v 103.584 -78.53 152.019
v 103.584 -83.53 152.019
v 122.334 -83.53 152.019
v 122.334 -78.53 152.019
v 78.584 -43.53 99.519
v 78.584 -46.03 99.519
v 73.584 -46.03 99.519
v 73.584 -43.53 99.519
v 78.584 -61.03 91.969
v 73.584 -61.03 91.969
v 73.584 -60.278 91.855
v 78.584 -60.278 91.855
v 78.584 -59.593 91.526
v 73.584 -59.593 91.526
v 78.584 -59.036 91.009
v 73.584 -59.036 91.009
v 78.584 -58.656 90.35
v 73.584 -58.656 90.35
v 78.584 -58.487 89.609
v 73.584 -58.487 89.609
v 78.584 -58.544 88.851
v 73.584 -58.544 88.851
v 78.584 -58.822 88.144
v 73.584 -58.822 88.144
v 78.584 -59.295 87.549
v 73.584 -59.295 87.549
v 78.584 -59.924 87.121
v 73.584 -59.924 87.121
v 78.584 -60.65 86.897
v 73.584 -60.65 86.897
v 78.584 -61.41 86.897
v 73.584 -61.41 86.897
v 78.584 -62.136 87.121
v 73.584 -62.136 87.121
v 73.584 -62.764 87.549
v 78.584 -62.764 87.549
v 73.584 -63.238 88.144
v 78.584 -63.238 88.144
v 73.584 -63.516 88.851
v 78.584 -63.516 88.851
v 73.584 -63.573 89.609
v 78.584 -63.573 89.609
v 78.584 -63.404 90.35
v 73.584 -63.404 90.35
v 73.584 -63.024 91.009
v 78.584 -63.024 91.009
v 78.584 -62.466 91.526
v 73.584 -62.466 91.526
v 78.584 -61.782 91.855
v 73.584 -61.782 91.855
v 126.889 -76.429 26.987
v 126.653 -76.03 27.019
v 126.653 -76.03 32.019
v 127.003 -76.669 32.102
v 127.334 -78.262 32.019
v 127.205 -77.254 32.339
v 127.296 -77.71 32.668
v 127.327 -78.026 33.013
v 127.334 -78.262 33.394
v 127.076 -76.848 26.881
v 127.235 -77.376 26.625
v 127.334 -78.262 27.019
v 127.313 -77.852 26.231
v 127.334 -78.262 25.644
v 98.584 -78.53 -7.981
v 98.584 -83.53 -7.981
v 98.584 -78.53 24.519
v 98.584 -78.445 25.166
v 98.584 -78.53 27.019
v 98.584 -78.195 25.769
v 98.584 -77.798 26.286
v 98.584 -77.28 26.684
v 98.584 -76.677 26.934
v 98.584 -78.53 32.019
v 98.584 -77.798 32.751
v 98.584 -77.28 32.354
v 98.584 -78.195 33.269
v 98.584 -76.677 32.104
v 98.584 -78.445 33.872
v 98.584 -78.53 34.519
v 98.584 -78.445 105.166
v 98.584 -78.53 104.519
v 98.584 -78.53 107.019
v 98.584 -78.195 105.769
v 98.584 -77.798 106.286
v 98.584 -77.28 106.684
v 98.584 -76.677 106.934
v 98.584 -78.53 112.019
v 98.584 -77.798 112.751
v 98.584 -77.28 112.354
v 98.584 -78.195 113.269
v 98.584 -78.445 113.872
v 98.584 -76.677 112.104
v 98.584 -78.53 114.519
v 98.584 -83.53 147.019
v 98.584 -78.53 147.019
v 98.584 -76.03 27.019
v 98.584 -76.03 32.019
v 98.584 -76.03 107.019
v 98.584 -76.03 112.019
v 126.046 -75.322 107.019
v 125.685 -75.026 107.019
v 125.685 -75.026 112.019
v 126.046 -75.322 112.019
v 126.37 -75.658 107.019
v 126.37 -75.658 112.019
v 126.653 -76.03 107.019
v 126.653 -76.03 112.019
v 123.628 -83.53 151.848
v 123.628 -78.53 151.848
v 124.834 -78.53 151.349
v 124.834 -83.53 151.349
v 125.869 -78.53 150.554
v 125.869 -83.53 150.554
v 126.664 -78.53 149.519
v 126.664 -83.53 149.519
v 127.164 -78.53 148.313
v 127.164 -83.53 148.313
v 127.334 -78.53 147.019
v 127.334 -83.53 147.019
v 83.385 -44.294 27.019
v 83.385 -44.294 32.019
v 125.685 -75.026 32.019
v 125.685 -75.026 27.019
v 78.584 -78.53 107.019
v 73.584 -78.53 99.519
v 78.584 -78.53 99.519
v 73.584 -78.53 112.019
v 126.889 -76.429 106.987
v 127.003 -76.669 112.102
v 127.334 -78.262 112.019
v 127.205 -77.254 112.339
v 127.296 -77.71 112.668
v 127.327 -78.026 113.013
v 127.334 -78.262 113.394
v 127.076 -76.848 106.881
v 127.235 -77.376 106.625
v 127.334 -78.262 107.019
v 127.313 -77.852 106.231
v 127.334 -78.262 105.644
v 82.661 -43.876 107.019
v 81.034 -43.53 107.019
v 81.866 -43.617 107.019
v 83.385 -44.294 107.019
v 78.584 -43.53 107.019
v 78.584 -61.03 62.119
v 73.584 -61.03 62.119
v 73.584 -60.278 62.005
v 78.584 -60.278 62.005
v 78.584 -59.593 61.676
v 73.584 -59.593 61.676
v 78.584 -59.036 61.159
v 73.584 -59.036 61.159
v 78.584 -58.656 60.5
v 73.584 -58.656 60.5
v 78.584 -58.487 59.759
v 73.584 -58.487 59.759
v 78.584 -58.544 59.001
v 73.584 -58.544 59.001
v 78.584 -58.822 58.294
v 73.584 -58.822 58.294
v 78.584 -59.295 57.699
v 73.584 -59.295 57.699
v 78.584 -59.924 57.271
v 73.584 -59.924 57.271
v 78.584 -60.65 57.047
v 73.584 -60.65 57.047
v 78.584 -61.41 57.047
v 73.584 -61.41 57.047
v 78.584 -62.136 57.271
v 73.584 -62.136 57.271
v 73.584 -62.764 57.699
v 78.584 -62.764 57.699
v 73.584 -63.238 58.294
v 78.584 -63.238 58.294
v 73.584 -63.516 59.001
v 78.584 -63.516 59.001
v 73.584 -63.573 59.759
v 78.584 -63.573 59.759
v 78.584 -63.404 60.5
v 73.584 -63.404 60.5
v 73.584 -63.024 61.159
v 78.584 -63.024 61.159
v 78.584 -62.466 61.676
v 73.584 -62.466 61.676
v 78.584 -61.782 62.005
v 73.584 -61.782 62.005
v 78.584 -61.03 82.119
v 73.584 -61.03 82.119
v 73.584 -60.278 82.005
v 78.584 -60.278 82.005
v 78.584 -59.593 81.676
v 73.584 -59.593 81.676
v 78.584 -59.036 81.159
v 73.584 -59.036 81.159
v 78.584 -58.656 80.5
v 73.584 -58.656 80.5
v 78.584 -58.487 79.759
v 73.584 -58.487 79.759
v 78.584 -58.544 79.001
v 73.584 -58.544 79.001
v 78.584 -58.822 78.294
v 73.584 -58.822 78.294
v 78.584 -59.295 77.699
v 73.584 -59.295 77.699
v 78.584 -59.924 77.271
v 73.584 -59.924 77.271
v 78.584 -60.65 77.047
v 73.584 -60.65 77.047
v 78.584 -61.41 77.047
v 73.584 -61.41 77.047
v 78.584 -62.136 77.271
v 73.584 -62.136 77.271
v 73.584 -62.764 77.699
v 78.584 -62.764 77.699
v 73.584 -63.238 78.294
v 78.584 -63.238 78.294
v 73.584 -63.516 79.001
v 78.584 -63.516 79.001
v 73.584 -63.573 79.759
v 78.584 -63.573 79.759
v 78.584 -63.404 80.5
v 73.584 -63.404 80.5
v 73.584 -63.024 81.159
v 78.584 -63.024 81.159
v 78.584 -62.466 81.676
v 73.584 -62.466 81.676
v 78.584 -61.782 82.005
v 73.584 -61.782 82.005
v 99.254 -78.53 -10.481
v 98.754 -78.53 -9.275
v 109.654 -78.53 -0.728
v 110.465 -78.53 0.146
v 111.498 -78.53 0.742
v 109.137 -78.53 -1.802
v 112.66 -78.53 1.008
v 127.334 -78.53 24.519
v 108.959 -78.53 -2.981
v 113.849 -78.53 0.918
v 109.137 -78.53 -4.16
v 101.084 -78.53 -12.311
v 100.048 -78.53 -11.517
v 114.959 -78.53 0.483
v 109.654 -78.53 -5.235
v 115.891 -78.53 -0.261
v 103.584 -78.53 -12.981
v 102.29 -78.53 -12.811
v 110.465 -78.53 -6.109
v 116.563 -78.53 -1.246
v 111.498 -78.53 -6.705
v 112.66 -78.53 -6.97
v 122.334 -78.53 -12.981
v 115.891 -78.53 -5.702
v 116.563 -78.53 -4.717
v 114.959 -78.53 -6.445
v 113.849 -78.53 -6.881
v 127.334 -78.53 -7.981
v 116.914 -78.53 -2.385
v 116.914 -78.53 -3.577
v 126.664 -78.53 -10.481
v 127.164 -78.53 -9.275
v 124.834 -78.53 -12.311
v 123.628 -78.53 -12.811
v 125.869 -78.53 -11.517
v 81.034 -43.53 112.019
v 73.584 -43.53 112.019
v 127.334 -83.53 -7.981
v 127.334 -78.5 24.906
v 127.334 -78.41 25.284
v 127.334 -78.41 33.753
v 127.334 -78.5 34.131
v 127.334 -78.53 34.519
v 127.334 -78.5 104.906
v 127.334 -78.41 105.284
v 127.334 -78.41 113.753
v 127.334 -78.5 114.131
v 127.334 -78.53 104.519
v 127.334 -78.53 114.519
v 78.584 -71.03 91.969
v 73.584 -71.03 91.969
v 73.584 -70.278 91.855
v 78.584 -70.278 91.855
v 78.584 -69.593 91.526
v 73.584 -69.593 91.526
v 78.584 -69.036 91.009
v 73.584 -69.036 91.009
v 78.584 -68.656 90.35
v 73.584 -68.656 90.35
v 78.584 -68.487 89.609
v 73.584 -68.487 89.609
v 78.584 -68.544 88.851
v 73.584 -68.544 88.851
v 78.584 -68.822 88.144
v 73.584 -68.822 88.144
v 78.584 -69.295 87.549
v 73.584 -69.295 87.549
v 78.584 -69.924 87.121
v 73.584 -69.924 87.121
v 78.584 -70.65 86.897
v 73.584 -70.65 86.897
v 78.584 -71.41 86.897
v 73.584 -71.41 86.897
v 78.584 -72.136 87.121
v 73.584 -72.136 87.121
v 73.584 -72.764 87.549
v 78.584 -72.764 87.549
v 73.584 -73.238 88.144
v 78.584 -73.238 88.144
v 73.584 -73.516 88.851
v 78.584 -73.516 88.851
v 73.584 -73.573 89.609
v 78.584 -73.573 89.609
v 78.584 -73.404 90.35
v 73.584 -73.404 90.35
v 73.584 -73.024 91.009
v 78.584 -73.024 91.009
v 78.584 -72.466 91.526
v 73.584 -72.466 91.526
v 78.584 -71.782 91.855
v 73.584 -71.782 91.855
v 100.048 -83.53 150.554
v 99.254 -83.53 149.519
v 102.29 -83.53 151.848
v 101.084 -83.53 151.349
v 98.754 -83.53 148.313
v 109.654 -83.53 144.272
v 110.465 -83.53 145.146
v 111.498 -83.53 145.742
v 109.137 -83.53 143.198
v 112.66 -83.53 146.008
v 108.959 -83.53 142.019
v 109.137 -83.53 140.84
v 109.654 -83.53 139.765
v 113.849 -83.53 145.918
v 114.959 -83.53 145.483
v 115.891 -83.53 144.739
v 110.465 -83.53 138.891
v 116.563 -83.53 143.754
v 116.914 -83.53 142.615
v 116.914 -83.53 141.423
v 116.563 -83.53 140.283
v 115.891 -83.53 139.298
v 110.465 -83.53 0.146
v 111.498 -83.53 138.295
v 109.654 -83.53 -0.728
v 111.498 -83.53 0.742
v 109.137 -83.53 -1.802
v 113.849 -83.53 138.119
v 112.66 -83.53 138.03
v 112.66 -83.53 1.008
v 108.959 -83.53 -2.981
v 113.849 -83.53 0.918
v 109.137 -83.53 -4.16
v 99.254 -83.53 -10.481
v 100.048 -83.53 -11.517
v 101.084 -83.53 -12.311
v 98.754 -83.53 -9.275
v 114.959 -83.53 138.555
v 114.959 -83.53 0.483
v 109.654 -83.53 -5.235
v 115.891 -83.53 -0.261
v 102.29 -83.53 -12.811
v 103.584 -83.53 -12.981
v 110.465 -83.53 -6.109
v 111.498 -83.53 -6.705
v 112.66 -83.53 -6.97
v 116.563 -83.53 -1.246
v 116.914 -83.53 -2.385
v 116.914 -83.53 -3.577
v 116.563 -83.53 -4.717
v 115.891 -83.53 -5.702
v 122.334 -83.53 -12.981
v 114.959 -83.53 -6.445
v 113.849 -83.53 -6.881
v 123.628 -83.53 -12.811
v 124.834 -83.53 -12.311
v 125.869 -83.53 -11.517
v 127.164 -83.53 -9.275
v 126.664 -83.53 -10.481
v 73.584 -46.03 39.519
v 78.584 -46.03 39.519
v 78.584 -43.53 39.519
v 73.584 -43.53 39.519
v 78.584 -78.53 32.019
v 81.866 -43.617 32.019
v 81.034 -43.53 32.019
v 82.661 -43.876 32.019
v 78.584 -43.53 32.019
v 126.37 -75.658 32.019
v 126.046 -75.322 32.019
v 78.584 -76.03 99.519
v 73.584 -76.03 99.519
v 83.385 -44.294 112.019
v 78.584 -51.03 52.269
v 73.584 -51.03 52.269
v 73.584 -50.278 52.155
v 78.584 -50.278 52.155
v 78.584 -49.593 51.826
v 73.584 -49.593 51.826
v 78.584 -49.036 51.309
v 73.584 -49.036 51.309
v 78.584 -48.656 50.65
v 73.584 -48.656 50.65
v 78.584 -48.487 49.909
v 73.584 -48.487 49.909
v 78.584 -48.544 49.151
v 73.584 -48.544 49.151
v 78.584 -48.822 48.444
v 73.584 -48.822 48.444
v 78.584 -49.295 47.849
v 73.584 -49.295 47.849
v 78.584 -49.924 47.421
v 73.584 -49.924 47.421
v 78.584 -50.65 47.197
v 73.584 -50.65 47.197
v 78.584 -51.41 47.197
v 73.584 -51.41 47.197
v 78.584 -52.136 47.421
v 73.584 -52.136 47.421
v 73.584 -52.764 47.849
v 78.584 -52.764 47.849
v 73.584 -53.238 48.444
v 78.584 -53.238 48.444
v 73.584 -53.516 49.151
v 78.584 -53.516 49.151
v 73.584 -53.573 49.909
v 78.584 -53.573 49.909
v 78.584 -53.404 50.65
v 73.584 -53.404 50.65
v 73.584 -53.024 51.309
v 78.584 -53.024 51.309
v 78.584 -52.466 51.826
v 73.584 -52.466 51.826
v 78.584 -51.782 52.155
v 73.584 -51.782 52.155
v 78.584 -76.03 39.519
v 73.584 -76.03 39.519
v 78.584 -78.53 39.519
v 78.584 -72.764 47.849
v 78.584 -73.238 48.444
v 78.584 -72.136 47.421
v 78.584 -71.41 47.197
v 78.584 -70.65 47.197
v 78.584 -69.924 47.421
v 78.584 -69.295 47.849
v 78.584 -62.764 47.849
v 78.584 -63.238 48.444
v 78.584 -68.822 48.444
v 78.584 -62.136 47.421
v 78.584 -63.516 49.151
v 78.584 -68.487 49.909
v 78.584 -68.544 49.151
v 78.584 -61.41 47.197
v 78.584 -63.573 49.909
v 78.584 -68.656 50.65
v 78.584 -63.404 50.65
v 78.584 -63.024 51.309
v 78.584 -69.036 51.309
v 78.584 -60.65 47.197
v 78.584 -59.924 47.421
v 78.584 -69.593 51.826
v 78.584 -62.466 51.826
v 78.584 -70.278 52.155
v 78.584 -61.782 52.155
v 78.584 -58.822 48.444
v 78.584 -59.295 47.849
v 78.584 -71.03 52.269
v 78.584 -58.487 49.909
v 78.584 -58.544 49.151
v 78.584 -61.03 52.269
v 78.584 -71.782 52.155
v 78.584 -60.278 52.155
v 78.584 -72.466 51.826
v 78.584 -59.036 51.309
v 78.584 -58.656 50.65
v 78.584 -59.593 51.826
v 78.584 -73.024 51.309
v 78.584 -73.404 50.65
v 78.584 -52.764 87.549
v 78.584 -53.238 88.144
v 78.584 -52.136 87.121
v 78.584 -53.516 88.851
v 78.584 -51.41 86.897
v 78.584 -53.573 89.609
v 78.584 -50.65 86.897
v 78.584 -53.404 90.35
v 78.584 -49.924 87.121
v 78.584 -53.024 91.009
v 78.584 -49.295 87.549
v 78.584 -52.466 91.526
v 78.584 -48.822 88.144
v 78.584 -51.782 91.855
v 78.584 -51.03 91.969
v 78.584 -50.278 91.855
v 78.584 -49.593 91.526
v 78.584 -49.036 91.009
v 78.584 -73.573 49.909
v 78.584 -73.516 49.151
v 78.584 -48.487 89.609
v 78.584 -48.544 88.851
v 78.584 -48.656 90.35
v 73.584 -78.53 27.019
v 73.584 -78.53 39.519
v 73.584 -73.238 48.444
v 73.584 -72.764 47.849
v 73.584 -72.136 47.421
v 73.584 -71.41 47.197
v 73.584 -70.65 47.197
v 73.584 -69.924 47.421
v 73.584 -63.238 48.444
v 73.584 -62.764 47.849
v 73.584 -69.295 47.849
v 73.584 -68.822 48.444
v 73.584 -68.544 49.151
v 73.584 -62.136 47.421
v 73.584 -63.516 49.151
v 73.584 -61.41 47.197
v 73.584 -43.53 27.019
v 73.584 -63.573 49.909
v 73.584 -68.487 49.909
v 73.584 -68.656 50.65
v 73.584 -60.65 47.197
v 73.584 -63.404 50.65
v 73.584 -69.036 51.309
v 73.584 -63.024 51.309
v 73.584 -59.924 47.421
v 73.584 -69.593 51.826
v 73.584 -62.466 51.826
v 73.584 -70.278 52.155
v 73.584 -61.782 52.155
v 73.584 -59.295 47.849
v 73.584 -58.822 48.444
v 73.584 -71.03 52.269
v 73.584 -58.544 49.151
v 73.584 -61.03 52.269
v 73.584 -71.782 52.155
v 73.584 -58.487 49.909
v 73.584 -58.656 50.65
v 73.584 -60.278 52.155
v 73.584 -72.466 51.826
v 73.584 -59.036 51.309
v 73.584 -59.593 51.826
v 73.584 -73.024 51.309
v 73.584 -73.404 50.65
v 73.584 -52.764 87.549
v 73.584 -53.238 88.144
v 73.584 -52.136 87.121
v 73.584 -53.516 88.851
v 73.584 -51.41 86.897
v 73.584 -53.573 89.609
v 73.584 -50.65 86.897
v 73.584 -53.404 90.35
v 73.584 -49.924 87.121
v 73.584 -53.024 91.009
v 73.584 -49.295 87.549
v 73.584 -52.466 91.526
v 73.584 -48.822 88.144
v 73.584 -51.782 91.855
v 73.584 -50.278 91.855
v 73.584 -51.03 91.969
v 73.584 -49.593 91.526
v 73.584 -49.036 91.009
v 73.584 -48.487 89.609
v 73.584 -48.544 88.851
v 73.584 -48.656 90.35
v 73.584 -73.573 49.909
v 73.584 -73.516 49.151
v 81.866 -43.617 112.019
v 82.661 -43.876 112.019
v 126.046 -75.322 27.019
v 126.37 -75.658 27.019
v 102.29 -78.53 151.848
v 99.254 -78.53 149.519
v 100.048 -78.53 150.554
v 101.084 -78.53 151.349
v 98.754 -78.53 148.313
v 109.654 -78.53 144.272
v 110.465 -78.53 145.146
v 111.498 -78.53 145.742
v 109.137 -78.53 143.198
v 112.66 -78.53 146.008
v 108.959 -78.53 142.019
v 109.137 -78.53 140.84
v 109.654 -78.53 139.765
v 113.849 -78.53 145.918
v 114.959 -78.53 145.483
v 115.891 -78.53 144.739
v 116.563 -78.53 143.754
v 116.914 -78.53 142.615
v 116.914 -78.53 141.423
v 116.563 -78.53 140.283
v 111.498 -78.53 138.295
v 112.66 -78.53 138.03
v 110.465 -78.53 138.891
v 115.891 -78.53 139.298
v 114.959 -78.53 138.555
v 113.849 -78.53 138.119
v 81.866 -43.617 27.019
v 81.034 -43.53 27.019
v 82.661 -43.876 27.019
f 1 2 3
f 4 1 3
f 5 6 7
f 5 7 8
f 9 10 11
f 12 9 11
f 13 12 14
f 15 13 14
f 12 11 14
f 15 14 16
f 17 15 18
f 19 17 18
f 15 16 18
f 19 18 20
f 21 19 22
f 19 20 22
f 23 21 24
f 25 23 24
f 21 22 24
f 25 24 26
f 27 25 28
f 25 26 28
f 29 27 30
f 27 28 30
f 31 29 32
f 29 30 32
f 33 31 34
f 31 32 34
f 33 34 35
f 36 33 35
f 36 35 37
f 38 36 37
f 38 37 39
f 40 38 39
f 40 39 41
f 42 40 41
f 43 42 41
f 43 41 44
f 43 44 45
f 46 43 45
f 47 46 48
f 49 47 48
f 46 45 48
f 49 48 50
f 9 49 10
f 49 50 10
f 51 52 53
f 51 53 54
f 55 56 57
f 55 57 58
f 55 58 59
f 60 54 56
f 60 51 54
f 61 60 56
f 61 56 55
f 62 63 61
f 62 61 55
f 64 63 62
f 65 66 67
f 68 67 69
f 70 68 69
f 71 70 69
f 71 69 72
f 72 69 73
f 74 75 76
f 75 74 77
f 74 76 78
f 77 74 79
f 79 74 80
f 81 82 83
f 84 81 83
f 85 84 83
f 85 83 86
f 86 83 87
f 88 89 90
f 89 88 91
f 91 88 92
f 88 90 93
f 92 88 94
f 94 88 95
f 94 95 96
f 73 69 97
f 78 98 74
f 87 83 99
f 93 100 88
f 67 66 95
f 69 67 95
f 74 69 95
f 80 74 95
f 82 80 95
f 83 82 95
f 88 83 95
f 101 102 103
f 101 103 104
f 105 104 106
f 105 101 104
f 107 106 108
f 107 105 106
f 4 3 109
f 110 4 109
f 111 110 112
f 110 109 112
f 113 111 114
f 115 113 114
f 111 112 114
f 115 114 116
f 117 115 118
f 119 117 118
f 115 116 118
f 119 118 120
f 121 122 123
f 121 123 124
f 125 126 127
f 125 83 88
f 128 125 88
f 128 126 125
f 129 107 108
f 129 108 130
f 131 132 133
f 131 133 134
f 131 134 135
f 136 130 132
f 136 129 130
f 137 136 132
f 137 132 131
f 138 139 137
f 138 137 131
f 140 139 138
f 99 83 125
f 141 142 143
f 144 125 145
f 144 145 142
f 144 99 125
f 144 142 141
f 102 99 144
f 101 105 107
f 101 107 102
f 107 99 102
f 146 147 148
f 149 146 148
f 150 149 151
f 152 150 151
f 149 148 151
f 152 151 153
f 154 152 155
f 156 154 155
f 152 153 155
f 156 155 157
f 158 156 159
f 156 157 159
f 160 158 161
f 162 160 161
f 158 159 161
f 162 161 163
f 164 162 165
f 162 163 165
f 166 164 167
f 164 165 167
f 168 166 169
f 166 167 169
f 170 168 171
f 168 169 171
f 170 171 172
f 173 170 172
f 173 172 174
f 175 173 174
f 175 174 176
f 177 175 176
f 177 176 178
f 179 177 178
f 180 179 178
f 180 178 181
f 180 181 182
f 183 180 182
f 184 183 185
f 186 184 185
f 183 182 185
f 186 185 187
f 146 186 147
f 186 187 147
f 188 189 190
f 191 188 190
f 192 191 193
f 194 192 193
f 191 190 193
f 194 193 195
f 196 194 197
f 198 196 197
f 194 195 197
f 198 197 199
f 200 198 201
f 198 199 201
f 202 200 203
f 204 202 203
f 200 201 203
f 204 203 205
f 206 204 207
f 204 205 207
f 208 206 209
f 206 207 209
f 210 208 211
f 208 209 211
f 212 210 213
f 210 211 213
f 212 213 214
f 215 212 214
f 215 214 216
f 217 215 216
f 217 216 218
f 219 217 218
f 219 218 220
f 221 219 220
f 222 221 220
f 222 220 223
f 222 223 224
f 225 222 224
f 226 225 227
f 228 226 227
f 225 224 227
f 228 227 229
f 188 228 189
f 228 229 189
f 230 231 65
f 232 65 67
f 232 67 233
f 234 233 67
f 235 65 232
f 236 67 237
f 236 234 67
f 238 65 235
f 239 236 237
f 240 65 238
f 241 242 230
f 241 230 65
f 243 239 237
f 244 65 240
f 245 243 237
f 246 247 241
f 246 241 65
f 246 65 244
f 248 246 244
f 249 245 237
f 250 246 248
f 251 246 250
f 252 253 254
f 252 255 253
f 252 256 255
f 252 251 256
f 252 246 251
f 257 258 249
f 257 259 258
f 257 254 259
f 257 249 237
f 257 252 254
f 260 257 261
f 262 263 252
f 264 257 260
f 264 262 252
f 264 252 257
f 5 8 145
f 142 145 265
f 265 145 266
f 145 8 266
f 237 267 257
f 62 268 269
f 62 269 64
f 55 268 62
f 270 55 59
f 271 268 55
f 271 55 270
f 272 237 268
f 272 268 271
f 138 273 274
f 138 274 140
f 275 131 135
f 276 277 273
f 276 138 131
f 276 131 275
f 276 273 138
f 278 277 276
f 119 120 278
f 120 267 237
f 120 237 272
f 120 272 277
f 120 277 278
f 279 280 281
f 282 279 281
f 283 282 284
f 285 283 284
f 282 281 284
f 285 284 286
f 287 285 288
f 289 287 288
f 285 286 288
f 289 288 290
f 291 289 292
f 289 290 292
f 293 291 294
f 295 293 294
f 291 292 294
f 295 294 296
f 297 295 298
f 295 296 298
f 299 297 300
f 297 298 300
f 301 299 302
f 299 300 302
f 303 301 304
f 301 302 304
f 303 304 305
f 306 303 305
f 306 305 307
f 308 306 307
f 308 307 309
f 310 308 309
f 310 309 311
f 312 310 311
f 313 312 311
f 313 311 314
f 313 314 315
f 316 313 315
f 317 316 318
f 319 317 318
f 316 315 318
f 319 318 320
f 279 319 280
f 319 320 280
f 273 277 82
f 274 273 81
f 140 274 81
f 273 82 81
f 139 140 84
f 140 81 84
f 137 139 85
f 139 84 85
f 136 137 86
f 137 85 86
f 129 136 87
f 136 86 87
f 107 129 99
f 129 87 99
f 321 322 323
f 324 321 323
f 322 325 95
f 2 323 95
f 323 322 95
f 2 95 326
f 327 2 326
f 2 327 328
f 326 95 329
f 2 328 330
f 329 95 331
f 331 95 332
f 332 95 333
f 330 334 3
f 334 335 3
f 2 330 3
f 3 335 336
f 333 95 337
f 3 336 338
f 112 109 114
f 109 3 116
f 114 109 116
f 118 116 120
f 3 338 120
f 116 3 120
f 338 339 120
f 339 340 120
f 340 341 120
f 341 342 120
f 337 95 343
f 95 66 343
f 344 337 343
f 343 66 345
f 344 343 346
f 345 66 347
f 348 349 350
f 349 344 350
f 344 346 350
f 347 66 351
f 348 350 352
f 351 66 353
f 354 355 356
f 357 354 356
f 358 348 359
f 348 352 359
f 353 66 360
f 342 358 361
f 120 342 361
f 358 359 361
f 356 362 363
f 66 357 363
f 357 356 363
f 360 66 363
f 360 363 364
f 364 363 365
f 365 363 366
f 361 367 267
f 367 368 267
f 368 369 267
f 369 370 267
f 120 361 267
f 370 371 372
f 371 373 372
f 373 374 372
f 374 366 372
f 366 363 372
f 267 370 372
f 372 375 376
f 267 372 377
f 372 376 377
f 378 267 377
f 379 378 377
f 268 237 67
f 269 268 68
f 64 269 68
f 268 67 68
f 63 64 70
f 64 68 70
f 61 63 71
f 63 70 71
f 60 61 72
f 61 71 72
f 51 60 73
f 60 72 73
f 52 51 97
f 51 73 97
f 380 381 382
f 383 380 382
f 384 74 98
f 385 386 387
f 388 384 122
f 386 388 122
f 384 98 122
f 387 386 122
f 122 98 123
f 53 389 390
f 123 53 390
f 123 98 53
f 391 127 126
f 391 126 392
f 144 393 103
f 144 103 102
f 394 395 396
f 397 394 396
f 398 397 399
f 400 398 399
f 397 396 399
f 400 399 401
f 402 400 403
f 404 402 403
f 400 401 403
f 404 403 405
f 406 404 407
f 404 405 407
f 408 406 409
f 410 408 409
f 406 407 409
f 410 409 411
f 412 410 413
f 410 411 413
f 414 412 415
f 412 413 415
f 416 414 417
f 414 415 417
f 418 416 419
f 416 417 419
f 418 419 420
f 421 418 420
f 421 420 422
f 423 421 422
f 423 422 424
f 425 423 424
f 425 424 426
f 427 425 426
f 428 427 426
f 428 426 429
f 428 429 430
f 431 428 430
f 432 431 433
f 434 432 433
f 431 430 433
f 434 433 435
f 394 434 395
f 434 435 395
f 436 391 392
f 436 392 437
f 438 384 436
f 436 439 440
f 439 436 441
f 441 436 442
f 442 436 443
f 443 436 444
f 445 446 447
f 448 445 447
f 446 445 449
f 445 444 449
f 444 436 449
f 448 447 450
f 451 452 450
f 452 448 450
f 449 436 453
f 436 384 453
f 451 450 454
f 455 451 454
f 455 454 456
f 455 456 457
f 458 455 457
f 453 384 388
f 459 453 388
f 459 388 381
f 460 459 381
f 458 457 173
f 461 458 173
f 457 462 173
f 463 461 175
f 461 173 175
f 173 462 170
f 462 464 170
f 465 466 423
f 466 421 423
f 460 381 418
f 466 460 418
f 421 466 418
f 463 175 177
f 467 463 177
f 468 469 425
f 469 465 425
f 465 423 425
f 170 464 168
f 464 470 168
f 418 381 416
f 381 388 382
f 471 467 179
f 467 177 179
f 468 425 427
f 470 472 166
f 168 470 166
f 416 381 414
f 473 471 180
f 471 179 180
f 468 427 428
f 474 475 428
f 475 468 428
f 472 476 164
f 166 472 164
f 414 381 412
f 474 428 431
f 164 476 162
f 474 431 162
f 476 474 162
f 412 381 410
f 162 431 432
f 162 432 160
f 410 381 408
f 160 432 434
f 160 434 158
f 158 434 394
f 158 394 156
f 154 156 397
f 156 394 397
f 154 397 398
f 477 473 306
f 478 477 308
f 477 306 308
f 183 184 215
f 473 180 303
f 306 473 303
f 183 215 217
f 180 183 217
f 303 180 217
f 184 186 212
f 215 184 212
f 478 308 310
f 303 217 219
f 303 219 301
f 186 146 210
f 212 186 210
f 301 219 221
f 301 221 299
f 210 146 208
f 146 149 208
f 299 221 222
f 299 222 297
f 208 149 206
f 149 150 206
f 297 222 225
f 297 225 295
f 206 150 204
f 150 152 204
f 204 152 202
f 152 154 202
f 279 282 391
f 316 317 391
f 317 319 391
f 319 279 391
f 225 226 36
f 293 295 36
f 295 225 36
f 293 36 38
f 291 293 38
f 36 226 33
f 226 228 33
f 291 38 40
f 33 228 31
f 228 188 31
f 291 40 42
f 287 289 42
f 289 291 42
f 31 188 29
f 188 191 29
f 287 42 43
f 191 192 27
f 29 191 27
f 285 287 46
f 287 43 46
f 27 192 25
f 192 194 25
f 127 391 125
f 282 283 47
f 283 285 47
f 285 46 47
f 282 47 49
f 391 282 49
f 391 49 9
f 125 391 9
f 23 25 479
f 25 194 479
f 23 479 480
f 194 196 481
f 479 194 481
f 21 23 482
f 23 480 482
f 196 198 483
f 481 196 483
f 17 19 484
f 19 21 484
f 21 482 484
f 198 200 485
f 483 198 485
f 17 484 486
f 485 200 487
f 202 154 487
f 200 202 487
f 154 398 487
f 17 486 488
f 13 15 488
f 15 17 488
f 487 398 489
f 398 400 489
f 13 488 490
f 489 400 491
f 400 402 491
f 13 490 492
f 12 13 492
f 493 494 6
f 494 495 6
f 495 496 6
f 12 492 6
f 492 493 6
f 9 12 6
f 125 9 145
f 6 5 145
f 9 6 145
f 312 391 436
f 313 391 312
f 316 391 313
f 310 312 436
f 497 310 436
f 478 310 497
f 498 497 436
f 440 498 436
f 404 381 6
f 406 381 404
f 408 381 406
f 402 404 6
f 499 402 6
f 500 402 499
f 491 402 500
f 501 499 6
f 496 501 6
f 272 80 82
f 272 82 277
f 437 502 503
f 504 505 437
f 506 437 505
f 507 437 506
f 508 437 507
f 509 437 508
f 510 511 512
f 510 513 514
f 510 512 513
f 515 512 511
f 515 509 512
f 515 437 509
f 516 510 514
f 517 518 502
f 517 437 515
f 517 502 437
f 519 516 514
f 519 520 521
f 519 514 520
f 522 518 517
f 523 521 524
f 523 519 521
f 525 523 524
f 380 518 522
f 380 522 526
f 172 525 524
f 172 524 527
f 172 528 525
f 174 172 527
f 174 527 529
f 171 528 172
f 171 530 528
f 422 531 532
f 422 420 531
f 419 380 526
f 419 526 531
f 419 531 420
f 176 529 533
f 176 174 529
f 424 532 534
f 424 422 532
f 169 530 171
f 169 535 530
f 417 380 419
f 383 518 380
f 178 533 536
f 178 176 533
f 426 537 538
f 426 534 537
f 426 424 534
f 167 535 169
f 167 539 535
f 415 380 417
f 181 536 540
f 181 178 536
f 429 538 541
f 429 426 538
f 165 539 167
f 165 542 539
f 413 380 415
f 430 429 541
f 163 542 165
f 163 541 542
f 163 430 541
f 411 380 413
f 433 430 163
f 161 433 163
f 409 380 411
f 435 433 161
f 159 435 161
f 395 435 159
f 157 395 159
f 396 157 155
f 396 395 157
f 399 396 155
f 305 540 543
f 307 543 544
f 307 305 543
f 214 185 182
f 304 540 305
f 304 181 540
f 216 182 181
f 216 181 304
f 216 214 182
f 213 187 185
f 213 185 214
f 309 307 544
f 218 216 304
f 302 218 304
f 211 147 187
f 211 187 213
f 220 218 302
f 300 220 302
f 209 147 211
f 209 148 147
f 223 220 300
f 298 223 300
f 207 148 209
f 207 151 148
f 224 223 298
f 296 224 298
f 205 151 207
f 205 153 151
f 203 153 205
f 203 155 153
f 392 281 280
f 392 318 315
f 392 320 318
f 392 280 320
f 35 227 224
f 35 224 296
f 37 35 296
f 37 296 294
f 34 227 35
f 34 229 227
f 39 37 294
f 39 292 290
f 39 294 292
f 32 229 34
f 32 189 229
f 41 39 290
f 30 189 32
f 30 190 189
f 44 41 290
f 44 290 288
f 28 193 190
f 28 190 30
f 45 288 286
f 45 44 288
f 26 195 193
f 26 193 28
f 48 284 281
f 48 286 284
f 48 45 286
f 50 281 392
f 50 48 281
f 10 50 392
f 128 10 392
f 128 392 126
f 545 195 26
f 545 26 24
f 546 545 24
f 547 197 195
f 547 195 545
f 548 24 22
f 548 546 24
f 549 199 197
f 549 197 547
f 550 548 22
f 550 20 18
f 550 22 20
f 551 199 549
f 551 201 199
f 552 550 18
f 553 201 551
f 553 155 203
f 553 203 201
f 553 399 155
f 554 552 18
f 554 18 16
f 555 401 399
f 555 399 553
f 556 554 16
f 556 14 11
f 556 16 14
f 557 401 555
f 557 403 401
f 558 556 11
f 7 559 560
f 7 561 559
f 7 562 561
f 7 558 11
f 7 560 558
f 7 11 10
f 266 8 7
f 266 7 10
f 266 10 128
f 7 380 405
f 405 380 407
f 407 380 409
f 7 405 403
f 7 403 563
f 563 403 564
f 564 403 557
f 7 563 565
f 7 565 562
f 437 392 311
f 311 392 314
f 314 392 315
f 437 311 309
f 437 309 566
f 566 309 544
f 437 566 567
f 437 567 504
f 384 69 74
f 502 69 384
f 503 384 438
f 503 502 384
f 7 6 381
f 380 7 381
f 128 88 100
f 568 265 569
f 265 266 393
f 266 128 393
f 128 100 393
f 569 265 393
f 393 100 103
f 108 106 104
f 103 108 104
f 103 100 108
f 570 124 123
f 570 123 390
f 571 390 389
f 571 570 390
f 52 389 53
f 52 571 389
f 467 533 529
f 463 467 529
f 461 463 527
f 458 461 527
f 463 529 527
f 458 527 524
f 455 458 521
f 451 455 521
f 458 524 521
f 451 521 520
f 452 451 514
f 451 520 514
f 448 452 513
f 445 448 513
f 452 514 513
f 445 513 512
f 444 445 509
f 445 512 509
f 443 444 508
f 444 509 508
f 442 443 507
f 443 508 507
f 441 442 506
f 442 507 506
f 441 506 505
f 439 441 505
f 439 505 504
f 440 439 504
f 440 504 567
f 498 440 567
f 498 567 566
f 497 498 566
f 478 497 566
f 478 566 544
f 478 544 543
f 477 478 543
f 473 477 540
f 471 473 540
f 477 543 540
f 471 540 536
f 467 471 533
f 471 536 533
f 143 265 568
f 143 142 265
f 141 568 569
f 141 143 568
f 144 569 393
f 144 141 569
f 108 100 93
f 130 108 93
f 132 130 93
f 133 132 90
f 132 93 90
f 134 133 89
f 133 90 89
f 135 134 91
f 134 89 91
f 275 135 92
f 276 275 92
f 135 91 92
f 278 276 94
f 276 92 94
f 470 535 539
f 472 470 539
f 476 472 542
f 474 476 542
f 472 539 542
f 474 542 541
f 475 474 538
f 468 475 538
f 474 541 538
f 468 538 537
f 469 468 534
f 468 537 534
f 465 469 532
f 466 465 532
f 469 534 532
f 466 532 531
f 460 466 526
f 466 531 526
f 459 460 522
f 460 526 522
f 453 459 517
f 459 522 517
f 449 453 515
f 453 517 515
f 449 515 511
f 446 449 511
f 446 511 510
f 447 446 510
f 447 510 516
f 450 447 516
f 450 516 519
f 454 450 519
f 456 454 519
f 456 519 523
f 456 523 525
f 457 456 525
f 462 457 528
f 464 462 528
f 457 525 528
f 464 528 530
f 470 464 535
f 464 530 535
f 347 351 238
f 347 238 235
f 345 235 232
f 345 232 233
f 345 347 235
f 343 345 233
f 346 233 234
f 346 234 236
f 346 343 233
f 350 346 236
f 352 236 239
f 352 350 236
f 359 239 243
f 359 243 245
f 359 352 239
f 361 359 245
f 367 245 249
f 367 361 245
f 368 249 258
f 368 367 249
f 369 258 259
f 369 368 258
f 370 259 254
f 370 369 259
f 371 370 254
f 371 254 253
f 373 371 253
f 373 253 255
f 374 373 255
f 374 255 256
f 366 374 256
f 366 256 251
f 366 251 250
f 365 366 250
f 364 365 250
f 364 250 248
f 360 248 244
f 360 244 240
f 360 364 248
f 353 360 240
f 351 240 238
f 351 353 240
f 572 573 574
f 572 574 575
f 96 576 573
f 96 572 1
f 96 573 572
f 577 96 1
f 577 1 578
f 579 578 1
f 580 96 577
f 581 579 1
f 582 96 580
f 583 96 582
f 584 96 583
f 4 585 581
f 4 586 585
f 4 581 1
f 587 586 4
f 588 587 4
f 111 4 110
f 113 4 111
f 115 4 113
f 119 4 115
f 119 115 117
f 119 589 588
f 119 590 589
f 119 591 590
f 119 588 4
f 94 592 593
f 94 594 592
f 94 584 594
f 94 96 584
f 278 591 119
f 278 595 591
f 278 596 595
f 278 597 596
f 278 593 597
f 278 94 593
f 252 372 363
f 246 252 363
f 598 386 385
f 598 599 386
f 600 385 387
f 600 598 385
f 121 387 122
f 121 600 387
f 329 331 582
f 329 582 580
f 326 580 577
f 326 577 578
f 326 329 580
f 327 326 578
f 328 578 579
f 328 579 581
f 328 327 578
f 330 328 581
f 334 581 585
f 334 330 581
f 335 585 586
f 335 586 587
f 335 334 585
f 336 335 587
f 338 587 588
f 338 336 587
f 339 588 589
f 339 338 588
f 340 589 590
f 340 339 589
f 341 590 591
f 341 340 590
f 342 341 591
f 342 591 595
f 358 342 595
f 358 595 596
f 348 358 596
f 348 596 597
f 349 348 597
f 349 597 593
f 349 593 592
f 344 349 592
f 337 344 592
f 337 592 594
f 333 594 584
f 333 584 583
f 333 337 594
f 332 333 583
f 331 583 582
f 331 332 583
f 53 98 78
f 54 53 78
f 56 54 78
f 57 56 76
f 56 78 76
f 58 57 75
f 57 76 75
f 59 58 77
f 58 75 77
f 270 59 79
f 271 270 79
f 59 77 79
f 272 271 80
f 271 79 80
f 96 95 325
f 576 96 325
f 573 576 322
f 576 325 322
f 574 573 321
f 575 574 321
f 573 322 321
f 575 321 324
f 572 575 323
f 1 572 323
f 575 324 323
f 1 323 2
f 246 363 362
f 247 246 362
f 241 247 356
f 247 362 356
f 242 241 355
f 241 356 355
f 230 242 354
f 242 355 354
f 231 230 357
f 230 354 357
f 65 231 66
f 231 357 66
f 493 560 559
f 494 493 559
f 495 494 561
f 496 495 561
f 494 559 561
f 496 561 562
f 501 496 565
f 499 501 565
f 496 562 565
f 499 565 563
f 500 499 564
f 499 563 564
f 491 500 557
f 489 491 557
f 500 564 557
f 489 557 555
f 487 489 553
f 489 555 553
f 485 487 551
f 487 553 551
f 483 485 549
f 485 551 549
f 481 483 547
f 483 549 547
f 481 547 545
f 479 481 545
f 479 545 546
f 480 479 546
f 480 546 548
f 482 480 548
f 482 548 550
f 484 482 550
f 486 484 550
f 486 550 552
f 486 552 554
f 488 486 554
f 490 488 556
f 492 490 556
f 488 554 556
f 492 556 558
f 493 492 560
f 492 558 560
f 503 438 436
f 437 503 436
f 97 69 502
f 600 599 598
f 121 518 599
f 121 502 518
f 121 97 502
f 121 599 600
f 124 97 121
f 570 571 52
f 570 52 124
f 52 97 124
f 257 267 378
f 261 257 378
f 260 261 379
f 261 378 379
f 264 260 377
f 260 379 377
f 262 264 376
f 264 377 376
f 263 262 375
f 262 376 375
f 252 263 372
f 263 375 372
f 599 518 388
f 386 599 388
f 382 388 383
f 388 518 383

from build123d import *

# Parameters (mm, degrees)
SKETCH1_R           = 4
BOSS_EXTRUDE1_DEPTH = 5
SKETCH2_W           = 5
SKETCH2_H           = 35
BOSS_EXTRUDE2_DEPTH = 53.75
SKETCH3_W           = 75
SKETCH3_H           = 35
SKETCH3_R           = 2.55
BOSS_EXTRUDE3_DEPTH = 5
CHAMFER1_SIZE       = 45
CHAMFER1_SIZE2      = 32.69441376
FILLET1_R           = 4
FILLET2_START       = 98.583917136
FILLET2_DEPTH       = 28.75
FILLET2_START_2     = 25.643804114
FILLET2_2_DEPTH     = 87.749778627
SKETCH4_W           = 60
SKETCH4_H           = 5
CUT_EXTRUDE1_DEPTH  = 5


with BuildPart() as part:
    # Sketch1 → Boss-Extrude1 (new body)
    with BuildSketch(Plane(origin=(0, -83.529928381, 0), x_dir=(1, 0, 0), z_dir=(0, 1, 0))):
        with BuildLine():
            Line((103.583917136, -152.018693427), (122.333917136, -152.018693427))
            ThreePointArc((122.333917136, -152.018693427), (125.869451042, -150.554227333), (127.333917136, -147.018693427))
            Line((127.333917136, -147.018693427), (127.333917136, 7.981306573))
            ThreePointArc((127.333917136, 7.981306573), (125.869451042, 11.516840479), (122.333917136, 12.981306573))
            Line((122.333917136, 12.981306573), (103.583917136, 12.981306573))
            ThreePointArc((103.583917136, 12.981306573), (100.04838323, 11.516840479), (98.583917136, 7.981306573))
            Line((98.583917136, 7.981306573), (98.583917136, -147.018693427))
            ThreePointArc((98.583917136, -147.018693427), (100.04838323, -150.554227333), (103.583917136, -152.018693427))
        make_face()
        with Locations(Location((112.958917136, -142.018693427, 0), (0, 0, 180))):
            Circle(SKETCH1_R, mode=Mode.SUBTRACT)
        with Locations(Location((112.958917136, 2.981306573, 0), (0, 0, 180))):
            Circle(SKETCH1_R, mode=Mode.SUBTRACT)
    extrude(amount=BOSS_EXTRUDE1_DEPTH)

    # Sketch2 → Boss-Extrude2 (add)
    with BuildSketch(Plane(origin=(127.333917136, 0, 0), x_dir=(0, 0, -1), z_dir=(1, 0, 0))):
        with Locations((-109.518693427, -61.029928381)):
            Rectangle(SKETCH2_W, SKETCH2_H)
        with Locations((-29.518693427, -61.029928381)):
            Rectangle(SKETCH2_W, SKETCH2_H)
    extrude(amount=-BOSS_EXTRUDE2_DEPTH)

    # Sketch3 → Boss-Extrude3 (add)
    with BuildSketch(Plane.ZY.offset(-73.583917136)):
        with Locations((69.518693427, -61.029928381)):
            Rectangle(SKETCH3_W, SKETCH3_H)
        with Locations((49.718693427, -61.029928381)):
            Circle(SKETCH3_R, mode=Mode.SUBTRACT)
        with Locations((89.418693427, -61.029928381)):
            Circle(SKETCH3_R, mode=Mode.SUBTRACT)
        with Locations((89.418693427, -71.029928381)):
            Circle(SKETCH3_R, mode=Mode.SUBTRACT)
        with Locations((89.418693427, -51.029928381)):
            Circle(SKETCH3_R, mode=Mode.SUBTRACT)
        with Locations((49.718693427, -51.029928381)):
            Circle(SKETCH3_R, mode=Mode.SUBTRACT)
        with Locations((49.718693427, -71.029928381)):
            Circle(SKETCH3_R, mode=Mode.SUBTRACT)
        with Locations((59.568693427, -61.029928381)):
            Circle(SKETCH3_R, mode=Mode.SUBTRACT)
        with Locations((79.568693427, -61.029928381)):
            Circle(SKETCH3_R, mode=Mode.SUBTRACT)
    extrude(amount=-BOSS_EXTRUDE3_DEPTH)

    # Chamfer1
    chamfer1_edges = [part.edges().sort_by_distance(p)[0] for p in [
        (127.333917136, -43.529928381, 109.518693427),
        (127.333917136, -43.529928381, 29.518693427),
    ]]
    chamfer1_side = [part.faces().sort_by_distance(p)[0] for p in [
        (100.458917136, -43.529928381, 111.013006473),
    ]]
    chamfer(chamfer1_edges, length=CHAMFER1_SIZE, length2=CHAMFER1_SIZE2, reference=chamfer1_side[0])

    # Fillet1
    fillet1_edges = [part.edges().sort_by_distance(p)[0] for p in [
        (127.333917136, -76.224342141, 29.518693427),
        (127.333917136, -76.224342141, 109.518693427),
        (82.333917136, -43.529928381, 29.518693427),
        (82.333917136, -43.529928381, 109.518693427),
    ]]
    fillet(fillet1_edges, radius=FILLET1_R)

    # Fillet2: read off the stored shape, not the designer's step
    # Fillet2 outline → Fillet2 (add)
    with BuildSketch(Plane.YZ.offset(FILLET2_START)):
        with BuildLine():
            ThreePointArc((-78.529928381, 24.518693427), (-77.797695334, 26.28646038), (-76.029928381, 27.018693427))
            Line((-76.029928381, 27.018693427), (-78.529928381, 27.018693427))
            Line((-78.529928381, 27.018693427), (-78.529928381, 24.518693427))
        make_face()
        with BuildLine():
            ThreePointArc((-76.029928381, 32.018693427), (-77.797695334, 32.750926474), (-78.529928381, 34.518693427))
            Line((-78.529928381, 34.518693427), (-78.529928381, 32.018693427))
            Line((-78.529928381, 32.018693427), (-76.029928381, 32.018693427))
        make_face()
        with BuildLine():
            ThreePointArc((-78.529928381, 104.518693427), (-77.797695334, 106.28646038), (-76.029928381, 107.018693427))
            Line((-76.029928381, 107.018693427), (-78.529928381, 107.018693427))
            Line((-78.529928381, 107.018693427), (-78.529928381, 104.518693427))
        make_face()
        with BuildLine():
            ThreePointArc((-76.029928381, 112.018693427), (-77.797695334, 112.750926474), (-78.529928381, 114.518693427))
            Line((-78.529928381, 114.518693427), (-78.529928381, 112.018693427))
            Line((-78.529928381, 112.018693427), (-76.029928381, 112.018693427))
        make_face()
    extrude(amount=FILLET2_DEPTH)

    # Fillet2 2 outline → Fillet2 2 (cut)
    with BuildSketch(Plane.XY.offset(FILLET2_START_2)):
        with BuildLine():
            Line((127.333917136, -76.029928381), (126.652934202, -76.029928381))
            ThreePointArc((126.652934202, -76.029928381), (127.159885528, -77.095411005), (127.333917136, -78.262443939))
            Line((127.333917136, -78.262443939), (127.333917136, -76.029928381))
        make_face()
    extrude(amount=FILLET2_2_DEPTH, mode=Mode.SUBTRACT)

    # Sketch4 → Cut-Extrude1 (cut)
    with BuildSketch(Plane(origin=(78.583917136, 0, 0), x_dir=(0, 0, -1), z_dir=(1, 0, 0))):
        with Locations((-69.518693427, -43.529928381)):
            Rectangle(SKETCH4_W, SKETCH4_H)
        with Locations((-69.518693427, -78.529928381)):
            Rectangle(SKETCH4_W, SKETCH4_H)
    extrude(amount=-CUT_EXTRUDE1_DEPTH, mode=Mode.SUBTRACT)


solid = part.part
